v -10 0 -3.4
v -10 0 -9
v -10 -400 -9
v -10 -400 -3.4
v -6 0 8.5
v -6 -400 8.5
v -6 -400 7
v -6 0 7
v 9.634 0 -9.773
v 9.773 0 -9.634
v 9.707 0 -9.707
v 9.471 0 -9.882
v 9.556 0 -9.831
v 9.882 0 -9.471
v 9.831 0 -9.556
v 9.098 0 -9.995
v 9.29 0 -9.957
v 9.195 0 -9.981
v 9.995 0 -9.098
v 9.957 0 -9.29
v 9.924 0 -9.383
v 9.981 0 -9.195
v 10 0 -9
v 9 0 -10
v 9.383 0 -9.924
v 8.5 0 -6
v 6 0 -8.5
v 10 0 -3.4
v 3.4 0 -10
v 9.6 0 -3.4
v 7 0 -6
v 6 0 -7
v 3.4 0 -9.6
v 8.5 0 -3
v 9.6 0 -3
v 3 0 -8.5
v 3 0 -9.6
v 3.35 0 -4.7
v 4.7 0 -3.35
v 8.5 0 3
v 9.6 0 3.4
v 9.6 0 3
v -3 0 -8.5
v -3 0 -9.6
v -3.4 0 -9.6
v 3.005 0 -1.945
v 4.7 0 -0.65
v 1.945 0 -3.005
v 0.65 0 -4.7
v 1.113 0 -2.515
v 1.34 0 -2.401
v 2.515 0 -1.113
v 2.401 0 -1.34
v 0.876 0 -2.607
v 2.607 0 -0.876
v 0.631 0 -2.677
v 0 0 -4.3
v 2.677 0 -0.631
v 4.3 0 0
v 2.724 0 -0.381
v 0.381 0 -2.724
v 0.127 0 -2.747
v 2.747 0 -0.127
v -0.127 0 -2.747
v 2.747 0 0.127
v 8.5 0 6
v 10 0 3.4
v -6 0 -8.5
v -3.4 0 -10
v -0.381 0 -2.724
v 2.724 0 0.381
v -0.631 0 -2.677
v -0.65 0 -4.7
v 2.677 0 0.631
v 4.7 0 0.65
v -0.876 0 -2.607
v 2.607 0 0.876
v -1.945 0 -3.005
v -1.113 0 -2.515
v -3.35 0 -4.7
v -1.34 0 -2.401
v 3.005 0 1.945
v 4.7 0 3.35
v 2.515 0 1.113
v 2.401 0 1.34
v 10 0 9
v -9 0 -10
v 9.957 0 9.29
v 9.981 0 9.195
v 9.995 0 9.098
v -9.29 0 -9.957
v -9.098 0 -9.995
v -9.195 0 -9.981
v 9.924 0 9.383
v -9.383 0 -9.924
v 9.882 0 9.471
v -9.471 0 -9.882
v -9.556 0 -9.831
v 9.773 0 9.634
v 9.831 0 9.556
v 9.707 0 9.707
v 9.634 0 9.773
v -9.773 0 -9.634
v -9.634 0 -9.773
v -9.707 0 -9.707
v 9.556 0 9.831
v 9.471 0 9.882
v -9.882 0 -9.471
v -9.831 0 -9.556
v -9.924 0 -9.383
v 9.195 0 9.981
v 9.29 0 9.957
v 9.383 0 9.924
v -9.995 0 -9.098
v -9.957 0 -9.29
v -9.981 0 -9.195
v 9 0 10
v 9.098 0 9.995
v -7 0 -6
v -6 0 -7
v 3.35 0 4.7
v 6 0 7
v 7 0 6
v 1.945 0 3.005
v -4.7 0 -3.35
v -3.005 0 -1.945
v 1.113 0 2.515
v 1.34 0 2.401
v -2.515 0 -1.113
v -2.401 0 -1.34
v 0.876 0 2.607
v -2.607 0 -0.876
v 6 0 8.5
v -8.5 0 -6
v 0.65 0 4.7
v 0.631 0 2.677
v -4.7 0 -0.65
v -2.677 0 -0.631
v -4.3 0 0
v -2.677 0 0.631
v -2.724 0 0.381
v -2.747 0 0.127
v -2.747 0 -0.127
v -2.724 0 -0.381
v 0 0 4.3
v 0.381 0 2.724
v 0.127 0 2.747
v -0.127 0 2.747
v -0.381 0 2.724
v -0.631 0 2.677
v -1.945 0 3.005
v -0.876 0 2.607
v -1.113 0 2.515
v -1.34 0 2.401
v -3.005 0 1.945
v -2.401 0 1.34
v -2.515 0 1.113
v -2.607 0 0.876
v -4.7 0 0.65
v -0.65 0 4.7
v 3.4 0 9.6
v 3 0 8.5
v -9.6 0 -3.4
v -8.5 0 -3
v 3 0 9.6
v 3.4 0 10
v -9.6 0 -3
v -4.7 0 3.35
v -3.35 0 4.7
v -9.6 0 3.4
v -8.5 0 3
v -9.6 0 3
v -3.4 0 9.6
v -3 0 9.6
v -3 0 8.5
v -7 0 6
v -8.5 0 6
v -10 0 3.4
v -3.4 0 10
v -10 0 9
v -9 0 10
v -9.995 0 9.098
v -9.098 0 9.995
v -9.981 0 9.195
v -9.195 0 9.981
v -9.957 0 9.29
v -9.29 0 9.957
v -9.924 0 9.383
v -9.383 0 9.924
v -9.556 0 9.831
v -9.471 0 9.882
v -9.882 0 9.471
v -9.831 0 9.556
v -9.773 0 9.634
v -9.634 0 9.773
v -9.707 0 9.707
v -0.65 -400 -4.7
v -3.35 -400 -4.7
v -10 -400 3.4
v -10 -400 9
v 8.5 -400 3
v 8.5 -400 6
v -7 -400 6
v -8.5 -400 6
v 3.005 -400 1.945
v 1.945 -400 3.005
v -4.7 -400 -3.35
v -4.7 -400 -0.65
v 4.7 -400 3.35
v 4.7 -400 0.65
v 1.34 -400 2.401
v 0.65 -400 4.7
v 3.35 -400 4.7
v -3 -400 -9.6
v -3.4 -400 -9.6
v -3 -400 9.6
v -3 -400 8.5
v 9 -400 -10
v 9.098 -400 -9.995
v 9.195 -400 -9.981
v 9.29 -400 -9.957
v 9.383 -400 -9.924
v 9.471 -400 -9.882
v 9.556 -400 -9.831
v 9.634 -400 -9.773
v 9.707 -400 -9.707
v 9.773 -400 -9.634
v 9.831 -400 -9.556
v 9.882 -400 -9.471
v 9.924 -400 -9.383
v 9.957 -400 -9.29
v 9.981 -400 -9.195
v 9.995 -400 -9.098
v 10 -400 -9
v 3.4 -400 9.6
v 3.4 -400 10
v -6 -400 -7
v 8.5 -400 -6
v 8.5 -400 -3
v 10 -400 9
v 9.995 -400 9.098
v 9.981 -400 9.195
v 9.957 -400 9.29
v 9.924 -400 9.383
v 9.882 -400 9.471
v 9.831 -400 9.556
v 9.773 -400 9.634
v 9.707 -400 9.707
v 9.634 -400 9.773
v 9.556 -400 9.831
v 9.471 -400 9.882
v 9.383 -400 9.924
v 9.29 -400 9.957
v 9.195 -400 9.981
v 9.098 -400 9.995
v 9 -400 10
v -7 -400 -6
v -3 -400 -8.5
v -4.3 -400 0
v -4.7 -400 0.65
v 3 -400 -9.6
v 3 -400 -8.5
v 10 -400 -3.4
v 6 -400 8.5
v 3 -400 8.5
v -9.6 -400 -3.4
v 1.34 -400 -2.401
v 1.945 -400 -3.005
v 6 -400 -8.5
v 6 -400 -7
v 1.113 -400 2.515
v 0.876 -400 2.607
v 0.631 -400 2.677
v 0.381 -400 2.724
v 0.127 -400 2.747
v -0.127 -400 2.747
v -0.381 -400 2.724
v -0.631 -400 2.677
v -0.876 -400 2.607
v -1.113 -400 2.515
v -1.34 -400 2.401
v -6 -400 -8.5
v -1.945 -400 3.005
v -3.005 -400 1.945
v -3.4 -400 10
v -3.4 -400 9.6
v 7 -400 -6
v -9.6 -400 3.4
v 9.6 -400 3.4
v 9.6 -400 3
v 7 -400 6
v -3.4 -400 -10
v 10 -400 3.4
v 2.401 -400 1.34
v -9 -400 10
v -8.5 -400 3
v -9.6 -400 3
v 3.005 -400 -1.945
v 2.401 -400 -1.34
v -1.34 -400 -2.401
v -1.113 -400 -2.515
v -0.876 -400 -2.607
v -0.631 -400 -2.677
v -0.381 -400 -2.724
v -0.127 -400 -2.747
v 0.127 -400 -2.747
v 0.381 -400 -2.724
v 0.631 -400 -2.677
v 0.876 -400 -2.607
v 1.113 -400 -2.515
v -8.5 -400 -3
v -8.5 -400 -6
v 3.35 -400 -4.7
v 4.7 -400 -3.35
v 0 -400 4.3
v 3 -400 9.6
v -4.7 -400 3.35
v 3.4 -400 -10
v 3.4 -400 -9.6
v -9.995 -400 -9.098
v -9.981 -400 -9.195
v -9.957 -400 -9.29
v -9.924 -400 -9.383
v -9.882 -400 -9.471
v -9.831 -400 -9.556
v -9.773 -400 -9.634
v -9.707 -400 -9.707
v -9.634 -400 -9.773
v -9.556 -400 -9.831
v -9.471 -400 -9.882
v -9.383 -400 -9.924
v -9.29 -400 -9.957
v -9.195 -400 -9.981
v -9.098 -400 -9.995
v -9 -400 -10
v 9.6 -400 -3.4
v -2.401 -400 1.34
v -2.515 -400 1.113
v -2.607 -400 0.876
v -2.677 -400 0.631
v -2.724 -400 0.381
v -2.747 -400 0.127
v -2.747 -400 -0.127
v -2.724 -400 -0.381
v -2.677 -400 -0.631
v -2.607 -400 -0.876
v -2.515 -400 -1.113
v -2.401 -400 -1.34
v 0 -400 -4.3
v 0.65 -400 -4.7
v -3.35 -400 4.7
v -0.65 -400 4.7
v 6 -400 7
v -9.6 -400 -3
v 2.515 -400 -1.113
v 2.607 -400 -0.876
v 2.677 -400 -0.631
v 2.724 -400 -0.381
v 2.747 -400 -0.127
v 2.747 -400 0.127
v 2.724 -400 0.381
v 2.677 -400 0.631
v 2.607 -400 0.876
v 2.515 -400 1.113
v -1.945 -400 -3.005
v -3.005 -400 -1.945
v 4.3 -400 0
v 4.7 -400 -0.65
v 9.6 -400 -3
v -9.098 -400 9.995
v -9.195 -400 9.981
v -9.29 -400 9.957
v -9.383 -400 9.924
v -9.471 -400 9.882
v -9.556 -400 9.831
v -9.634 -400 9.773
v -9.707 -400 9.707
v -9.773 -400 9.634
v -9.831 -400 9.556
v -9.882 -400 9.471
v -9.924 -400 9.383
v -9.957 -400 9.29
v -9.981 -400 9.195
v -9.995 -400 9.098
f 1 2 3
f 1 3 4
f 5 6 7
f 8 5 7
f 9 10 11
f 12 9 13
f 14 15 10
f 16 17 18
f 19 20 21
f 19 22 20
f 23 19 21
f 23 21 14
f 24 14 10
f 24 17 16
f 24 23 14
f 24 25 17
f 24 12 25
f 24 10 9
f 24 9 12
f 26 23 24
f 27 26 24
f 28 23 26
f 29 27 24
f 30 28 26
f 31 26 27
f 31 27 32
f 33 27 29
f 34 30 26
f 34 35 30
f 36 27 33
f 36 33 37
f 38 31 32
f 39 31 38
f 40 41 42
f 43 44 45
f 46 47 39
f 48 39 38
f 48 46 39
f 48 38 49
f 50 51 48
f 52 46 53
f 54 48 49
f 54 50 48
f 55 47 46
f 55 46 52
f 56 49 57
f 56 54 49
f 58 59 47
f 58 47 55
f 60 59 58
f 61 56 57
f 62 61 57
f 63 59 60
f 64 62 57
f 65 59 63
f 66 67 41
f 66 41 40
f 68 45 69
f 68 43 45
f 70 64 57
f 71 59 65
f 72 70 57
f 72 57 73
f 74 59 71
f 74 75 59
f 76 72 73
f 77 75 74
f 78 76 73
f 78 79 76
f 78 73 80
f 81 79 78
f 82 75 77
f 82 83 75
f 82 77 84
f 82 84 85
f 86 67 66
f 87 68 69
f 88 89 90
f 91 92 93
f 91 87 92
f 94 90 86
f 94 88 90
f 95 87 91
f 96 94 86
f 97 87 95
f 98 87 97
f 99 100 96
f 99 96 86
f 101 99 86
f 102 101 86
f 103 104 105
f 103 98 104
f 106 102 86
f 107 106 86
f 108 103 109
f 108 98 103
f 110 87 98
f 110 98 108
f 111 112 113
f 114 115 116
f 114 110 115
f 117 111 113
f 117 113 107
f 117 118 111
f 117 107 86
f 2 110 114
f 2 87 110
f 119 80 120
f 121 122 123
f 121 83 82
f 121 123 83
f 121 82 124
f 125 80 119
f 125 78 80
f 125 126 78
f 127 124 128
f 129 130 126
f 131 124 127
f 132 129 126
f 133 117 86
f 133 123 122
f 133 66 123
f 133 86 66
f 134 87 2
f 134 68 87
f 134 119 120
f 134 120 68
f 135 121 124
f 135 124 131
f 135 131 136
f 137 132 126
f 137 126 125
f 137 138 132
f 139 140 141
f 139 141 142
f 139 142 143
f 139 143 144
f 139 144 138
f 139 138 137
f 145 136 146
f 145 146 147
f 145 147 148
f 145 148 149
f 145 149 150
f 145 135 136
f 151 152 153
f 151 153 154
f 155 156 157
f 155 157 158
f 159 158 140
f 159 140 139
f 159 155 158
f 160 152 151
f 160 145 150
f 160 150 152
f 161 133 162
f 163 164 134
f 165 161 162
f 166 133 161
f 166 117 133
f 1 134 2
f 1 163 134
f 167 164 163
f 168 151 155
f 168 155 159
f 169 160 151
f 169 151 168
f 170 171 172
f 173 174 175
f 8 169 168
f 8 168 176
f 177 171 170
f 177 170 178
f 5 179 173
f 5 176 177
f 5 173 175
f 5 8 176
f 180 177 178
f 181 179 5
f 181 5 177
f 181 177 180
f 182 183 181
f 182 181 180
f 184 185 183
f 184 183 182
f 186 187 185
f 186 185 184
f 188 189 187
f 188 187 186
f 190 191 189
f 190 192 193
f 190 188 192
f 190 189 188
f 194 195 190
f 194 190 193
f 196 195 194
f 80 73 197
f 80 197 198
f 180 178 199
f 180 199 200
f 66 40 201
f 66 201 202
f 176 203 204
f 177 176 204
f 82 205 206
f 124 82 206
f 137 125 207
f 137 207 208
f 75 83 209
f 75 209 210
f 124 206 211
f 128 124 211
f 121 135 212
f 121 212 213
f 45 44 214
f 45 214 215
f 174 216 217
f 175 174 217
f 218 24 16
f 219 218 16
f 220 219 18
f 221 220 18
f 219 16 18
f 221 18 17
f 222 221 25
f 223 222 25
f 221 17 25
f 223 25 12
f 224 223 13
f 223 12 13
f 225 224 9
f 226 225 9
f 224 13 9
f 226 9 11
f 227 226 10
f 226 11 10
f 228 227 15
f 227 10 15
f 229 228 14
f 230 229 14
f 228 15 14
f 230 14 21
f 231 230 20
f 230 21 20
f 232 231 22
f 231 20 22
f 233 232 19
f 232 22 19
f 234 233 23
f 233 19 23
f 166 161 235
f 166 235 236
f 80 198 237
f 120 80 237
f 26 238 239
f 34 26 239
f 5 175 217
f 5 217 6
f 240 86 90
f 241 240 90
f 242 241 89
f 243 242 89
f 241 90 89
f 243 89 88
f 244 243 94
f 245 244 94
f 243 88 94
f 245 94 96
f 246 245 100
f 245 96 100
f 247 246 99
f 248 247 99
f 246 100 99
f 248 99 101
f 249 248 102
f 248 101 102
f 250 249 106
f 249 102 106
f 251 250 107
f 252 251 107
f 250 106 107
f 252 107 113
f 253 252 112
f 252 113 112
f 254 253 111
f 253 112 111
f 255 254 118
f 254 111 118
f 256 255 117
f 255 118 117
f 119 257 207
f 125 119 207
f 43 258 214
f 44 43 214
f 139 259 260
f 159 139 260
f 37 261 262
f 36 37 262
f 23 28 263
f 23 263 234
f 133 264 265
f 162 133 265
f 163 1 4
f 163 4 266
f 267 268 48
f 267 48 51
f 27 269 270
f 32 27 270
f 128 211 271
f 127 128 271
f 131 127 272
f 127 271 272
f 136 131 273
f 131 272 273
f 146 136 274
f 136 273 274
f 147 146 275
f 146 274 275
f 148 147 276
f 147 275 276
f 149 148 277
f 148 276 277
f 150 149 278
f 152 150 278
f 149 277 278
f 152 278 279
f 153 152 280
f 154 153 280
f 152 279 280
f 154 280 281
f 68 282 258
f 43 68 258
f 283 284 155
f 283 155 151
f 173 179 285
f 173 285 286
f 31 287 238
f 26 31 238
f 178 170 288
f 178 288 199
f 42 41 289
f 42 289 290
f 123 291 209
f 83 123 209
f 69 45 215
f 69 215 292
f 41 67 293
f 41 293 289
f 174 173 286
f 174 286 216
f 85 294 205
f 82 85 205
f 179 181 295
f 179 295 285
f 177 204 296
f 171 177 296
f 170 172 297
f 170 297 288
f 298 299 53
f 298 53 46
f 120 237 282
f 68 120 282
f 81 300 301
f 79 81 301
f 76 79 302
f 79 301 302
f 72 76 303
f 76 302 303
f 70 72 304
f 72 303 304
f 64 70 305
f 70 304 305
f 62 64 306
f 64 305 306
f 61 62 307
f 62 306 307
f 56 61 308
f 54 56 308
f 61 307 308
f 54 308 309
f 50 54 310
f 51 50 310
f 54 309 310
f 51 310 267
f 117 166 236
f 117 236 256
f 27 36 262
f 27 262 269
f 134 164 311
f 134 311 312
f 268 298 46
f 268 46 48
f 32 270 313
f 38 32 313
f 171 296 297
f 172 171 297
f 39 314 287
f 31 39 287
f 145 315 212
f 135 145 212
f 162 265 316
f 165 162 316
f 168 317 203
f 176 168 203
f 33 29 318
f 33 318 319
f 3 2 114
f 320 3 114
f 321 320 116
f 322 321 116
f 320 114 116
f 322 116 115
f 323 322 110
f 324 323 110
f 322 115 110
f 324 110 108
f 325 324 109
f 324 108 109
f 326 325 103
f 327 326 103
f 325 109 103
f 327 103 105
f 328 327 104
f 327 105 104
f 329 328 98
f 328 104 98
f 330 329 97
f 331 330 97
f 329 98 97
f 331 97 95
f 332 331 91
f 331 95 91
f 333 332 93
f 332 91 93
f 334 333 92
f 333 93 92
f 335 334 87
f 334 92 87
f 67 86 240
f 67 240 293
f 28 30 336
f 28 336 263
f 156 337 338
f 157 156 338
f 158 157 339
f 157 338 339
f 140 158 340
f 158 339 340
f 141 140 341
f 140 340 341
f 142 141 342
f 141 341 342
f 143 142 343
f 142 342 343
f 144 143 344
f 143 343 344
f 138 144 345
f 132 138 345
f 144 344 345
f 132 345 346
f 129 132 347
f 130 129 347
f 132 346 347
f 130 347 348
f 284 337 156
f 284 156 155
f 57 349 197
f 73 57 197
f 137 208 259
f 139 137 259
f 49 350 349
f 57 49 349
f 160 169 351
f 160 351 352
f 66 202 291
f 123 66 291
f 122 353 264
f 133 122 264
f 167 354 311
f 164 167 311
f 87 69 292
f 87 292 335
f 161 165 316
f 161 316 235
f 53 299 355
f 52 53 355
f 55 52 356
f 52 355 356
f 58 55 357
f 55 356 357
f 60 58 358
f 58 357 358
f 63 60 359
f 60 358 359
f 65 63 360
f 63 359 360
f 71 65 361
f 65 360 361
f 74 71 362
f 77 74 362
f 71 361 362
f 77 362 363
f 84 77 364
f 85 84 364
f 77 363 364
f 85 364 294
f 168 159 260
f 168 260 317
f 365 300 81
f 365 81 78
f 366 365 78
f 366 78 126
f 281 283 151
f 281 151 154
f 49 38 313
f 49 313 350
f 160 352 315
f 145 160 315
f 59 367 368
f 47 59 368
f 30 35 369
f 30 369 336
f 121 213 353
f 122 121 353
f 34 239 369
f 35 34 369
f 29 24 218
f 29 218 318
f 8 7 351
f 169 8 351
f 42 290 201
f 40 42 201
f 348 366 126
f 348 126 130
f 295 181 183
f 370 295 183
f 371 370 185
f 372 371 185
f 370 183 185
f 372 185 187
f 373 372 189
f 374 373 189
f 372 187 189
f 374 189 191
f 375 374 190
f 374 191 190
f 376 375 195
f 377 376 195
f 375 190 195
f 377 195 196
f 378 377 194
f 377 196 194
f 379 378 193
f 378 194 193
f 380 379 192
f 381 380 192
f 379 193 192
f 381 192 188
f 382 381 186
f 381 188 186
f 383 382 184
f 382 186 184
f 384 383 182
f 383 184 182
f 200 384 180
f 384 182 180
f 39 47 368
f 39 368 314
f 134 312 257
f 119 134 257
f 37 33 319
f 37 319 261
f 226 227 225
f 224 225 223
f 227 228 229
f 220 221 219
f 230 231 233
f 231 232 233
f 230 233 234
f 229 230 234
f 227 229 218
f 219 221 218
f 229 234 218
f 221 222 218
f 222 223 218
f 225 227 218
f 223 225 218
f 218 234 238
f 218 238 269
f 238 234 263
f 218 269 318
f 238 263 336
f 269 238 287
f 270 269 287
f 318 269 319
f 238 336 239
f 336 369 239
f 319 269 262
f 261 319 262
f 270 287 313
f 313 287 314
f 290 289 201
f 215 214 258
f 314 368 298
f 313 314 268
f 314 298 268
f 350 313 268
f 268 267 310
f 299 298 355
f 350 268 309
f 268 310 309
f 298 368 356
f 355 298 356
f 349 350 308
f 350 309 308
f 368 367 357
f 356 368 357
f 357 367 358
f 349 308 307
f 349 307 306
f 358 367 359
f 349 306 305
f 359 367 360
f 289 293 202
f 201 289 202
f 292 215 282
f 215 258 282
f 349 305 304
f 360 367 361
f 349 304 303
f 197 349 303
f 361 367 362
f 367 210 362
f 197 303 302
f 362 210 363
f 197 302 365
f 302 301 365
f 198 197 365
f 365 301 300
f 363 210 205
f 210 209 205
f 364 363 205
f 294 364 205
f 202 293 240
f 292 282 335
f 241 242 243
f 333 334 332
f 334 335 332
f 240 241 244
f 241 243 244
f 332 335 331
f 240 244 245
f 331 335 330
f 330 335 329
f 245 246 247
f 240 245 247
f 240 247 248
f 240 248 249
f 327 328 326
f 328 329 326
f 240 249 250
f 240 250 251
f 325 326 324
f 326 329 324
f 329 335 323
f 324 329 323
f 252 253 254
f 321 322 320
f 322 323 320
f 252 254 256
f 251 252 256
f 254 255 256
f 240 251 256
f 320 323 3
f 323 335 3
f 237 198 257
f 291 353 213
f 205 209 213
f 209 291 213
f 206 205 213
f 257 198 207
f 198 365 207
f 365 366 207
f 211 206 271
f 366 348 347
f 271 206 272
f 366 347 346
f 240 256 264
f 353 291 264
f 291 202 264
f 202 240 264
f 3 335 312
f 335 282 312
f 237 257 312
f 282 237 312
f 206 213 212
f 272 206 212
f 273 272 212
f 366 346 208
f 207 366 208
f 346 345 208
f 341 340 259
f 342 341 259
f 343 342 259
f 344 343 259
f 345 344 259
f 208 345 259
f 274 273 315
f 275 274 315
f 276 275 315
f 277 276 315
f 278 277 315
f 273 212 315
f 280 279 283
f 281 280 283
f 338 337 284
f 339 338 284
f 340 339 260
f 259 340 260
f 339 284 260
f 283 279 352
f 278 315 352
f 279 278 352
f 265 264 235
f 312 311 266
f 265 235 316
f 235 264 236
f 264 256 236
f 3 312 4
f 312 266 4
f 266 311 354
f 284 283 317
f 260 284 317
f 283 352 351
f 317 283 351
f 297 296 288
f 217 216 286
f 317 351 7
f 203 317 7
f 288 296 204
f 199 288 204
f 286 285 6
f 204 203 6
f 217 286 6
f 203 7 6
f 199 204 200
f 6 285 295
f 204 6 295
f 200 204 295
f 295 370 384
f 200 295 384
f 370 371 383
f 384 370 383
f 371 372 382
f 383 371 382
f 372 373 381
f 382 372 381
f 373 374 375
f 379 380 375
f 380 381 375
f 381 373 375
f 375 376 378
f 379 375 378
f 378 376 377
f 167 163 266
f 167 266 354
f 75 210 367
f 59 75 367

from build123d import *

# Parameters (mm, degrees)
PAD_DEPTH          = 400
POCKET_DEPTH       = 400
POLARPATTERN_COUNT = 4
POCKET001_DEPTH    = 400


with BuildPart() as part:
    # Sketch → Pad (new body)
    with BuildSketch(Plane.XZ):
        with BuildLine():
            Line((-9, 10), (9, 10))
            ThreePointArc((10, 9), (9.707107, 9.707107), (9, 10))
            Line((10, 9), (10, -9))
            ThreePointArc((9, -10), (9.707107, -9.707107), (10, -9))
            Line((9, -10), (-9, -10))
            ThreePointArc((-10, -9), (-9.707107, -9.707107), (-9, -10))
            Line((-10, -9), (-10, 9))
            ThreePointArc((-9, 10), (-9.707107, 9.707107), (-10, 9))
        make_face()
    extrude(amount=PAD_DEPTH)

    # Sketch001 (on Face10 of Pad) → Pocket (cut)
    with BuildSketch(Plane.XZ.offset(400)):
        Polygon((-3.4, 10), (-3.4, 9.6), (-3, 9.6), (-3, 8.5), (-6, 8.5), (-6, 7), (-3.35, 4.7), (-0.65, 4.7), (0, 4.3), (0.65, 4.7), (3.35, 4.7), (6, 7), (6, 8.5), (3, 8.5), (3, 9.6), (3.4, 9.6), (3.4, 10), align=None)
    pocket = extrude(amount=-POCKET_DEPTH, mode=Mode.SUBTRACT)

    # PolarPattern: Pocket ×4 about axis
    polarpattern_axis = Axis((0, -400, 0), (0, -1, 0))
    for i in range(1, POLARPATTERN_COUNT):
        add(pocket.rotate(polarpattern_axis, i * 360 / POLARPATTERN_COUNT), mode=Mode.SUBTRACT)

    # Sketch002 (on Face4 of PolarPattern) → Pocket001 (cut)
    with BuildSketch(Plane.XZ.offset(400)):
        with BuildLine():
            ThreePointArc((1.340499, 2.401159), (0, 2.75), (-1.340499, 2.401159))
            Line((-1.944544, 3.005204), (-1.340499, 2.401159))
            Line((-3.005204, 1.944544), (-1.944544, 3.005204))
            Line((-2.401159, 1.340499), (-3.005204, 1.944544))
            ThreePointArc((-2.401159, 1.340499), (-2.75, 0), (-2.401159, -1.340499))
            Line((-3.005204, -1.944544), (-2.401159, -1.340499))
            Line((-1.944544, -3.005204), (-3.005204, -1.944544))
            Line((-1.340499, -2.401159), (-1.944544, -3.005204))
            ThreePointArc((-1.340499, -2.401159), (0, -2.75), (1.340499, -2.401159))
            Line((1.944544, -3.005204), (1.340499, -2.401159))
            Line((3.005204, -1.944544), (1.944544, -3.005204))
            Line((2.401159, -1.340499), (3.005204, -1.944544))
            ThreePointArc((2.401159, -1.340499), (2.75, 0), (2.401159, 1.340499))
            Line((2.401159, 1.340499), (3.005204, 1.944544))
            Line((3.005204, 1.944544), (1.944544, 3.005204))
            Line((1.944544, 3.005204), (1.340499, 2.401159))
        make_face()
    extrude(amount=-POCKET001_DEPTH, mode=Mode.SUBTRACT)


solid = part.part
